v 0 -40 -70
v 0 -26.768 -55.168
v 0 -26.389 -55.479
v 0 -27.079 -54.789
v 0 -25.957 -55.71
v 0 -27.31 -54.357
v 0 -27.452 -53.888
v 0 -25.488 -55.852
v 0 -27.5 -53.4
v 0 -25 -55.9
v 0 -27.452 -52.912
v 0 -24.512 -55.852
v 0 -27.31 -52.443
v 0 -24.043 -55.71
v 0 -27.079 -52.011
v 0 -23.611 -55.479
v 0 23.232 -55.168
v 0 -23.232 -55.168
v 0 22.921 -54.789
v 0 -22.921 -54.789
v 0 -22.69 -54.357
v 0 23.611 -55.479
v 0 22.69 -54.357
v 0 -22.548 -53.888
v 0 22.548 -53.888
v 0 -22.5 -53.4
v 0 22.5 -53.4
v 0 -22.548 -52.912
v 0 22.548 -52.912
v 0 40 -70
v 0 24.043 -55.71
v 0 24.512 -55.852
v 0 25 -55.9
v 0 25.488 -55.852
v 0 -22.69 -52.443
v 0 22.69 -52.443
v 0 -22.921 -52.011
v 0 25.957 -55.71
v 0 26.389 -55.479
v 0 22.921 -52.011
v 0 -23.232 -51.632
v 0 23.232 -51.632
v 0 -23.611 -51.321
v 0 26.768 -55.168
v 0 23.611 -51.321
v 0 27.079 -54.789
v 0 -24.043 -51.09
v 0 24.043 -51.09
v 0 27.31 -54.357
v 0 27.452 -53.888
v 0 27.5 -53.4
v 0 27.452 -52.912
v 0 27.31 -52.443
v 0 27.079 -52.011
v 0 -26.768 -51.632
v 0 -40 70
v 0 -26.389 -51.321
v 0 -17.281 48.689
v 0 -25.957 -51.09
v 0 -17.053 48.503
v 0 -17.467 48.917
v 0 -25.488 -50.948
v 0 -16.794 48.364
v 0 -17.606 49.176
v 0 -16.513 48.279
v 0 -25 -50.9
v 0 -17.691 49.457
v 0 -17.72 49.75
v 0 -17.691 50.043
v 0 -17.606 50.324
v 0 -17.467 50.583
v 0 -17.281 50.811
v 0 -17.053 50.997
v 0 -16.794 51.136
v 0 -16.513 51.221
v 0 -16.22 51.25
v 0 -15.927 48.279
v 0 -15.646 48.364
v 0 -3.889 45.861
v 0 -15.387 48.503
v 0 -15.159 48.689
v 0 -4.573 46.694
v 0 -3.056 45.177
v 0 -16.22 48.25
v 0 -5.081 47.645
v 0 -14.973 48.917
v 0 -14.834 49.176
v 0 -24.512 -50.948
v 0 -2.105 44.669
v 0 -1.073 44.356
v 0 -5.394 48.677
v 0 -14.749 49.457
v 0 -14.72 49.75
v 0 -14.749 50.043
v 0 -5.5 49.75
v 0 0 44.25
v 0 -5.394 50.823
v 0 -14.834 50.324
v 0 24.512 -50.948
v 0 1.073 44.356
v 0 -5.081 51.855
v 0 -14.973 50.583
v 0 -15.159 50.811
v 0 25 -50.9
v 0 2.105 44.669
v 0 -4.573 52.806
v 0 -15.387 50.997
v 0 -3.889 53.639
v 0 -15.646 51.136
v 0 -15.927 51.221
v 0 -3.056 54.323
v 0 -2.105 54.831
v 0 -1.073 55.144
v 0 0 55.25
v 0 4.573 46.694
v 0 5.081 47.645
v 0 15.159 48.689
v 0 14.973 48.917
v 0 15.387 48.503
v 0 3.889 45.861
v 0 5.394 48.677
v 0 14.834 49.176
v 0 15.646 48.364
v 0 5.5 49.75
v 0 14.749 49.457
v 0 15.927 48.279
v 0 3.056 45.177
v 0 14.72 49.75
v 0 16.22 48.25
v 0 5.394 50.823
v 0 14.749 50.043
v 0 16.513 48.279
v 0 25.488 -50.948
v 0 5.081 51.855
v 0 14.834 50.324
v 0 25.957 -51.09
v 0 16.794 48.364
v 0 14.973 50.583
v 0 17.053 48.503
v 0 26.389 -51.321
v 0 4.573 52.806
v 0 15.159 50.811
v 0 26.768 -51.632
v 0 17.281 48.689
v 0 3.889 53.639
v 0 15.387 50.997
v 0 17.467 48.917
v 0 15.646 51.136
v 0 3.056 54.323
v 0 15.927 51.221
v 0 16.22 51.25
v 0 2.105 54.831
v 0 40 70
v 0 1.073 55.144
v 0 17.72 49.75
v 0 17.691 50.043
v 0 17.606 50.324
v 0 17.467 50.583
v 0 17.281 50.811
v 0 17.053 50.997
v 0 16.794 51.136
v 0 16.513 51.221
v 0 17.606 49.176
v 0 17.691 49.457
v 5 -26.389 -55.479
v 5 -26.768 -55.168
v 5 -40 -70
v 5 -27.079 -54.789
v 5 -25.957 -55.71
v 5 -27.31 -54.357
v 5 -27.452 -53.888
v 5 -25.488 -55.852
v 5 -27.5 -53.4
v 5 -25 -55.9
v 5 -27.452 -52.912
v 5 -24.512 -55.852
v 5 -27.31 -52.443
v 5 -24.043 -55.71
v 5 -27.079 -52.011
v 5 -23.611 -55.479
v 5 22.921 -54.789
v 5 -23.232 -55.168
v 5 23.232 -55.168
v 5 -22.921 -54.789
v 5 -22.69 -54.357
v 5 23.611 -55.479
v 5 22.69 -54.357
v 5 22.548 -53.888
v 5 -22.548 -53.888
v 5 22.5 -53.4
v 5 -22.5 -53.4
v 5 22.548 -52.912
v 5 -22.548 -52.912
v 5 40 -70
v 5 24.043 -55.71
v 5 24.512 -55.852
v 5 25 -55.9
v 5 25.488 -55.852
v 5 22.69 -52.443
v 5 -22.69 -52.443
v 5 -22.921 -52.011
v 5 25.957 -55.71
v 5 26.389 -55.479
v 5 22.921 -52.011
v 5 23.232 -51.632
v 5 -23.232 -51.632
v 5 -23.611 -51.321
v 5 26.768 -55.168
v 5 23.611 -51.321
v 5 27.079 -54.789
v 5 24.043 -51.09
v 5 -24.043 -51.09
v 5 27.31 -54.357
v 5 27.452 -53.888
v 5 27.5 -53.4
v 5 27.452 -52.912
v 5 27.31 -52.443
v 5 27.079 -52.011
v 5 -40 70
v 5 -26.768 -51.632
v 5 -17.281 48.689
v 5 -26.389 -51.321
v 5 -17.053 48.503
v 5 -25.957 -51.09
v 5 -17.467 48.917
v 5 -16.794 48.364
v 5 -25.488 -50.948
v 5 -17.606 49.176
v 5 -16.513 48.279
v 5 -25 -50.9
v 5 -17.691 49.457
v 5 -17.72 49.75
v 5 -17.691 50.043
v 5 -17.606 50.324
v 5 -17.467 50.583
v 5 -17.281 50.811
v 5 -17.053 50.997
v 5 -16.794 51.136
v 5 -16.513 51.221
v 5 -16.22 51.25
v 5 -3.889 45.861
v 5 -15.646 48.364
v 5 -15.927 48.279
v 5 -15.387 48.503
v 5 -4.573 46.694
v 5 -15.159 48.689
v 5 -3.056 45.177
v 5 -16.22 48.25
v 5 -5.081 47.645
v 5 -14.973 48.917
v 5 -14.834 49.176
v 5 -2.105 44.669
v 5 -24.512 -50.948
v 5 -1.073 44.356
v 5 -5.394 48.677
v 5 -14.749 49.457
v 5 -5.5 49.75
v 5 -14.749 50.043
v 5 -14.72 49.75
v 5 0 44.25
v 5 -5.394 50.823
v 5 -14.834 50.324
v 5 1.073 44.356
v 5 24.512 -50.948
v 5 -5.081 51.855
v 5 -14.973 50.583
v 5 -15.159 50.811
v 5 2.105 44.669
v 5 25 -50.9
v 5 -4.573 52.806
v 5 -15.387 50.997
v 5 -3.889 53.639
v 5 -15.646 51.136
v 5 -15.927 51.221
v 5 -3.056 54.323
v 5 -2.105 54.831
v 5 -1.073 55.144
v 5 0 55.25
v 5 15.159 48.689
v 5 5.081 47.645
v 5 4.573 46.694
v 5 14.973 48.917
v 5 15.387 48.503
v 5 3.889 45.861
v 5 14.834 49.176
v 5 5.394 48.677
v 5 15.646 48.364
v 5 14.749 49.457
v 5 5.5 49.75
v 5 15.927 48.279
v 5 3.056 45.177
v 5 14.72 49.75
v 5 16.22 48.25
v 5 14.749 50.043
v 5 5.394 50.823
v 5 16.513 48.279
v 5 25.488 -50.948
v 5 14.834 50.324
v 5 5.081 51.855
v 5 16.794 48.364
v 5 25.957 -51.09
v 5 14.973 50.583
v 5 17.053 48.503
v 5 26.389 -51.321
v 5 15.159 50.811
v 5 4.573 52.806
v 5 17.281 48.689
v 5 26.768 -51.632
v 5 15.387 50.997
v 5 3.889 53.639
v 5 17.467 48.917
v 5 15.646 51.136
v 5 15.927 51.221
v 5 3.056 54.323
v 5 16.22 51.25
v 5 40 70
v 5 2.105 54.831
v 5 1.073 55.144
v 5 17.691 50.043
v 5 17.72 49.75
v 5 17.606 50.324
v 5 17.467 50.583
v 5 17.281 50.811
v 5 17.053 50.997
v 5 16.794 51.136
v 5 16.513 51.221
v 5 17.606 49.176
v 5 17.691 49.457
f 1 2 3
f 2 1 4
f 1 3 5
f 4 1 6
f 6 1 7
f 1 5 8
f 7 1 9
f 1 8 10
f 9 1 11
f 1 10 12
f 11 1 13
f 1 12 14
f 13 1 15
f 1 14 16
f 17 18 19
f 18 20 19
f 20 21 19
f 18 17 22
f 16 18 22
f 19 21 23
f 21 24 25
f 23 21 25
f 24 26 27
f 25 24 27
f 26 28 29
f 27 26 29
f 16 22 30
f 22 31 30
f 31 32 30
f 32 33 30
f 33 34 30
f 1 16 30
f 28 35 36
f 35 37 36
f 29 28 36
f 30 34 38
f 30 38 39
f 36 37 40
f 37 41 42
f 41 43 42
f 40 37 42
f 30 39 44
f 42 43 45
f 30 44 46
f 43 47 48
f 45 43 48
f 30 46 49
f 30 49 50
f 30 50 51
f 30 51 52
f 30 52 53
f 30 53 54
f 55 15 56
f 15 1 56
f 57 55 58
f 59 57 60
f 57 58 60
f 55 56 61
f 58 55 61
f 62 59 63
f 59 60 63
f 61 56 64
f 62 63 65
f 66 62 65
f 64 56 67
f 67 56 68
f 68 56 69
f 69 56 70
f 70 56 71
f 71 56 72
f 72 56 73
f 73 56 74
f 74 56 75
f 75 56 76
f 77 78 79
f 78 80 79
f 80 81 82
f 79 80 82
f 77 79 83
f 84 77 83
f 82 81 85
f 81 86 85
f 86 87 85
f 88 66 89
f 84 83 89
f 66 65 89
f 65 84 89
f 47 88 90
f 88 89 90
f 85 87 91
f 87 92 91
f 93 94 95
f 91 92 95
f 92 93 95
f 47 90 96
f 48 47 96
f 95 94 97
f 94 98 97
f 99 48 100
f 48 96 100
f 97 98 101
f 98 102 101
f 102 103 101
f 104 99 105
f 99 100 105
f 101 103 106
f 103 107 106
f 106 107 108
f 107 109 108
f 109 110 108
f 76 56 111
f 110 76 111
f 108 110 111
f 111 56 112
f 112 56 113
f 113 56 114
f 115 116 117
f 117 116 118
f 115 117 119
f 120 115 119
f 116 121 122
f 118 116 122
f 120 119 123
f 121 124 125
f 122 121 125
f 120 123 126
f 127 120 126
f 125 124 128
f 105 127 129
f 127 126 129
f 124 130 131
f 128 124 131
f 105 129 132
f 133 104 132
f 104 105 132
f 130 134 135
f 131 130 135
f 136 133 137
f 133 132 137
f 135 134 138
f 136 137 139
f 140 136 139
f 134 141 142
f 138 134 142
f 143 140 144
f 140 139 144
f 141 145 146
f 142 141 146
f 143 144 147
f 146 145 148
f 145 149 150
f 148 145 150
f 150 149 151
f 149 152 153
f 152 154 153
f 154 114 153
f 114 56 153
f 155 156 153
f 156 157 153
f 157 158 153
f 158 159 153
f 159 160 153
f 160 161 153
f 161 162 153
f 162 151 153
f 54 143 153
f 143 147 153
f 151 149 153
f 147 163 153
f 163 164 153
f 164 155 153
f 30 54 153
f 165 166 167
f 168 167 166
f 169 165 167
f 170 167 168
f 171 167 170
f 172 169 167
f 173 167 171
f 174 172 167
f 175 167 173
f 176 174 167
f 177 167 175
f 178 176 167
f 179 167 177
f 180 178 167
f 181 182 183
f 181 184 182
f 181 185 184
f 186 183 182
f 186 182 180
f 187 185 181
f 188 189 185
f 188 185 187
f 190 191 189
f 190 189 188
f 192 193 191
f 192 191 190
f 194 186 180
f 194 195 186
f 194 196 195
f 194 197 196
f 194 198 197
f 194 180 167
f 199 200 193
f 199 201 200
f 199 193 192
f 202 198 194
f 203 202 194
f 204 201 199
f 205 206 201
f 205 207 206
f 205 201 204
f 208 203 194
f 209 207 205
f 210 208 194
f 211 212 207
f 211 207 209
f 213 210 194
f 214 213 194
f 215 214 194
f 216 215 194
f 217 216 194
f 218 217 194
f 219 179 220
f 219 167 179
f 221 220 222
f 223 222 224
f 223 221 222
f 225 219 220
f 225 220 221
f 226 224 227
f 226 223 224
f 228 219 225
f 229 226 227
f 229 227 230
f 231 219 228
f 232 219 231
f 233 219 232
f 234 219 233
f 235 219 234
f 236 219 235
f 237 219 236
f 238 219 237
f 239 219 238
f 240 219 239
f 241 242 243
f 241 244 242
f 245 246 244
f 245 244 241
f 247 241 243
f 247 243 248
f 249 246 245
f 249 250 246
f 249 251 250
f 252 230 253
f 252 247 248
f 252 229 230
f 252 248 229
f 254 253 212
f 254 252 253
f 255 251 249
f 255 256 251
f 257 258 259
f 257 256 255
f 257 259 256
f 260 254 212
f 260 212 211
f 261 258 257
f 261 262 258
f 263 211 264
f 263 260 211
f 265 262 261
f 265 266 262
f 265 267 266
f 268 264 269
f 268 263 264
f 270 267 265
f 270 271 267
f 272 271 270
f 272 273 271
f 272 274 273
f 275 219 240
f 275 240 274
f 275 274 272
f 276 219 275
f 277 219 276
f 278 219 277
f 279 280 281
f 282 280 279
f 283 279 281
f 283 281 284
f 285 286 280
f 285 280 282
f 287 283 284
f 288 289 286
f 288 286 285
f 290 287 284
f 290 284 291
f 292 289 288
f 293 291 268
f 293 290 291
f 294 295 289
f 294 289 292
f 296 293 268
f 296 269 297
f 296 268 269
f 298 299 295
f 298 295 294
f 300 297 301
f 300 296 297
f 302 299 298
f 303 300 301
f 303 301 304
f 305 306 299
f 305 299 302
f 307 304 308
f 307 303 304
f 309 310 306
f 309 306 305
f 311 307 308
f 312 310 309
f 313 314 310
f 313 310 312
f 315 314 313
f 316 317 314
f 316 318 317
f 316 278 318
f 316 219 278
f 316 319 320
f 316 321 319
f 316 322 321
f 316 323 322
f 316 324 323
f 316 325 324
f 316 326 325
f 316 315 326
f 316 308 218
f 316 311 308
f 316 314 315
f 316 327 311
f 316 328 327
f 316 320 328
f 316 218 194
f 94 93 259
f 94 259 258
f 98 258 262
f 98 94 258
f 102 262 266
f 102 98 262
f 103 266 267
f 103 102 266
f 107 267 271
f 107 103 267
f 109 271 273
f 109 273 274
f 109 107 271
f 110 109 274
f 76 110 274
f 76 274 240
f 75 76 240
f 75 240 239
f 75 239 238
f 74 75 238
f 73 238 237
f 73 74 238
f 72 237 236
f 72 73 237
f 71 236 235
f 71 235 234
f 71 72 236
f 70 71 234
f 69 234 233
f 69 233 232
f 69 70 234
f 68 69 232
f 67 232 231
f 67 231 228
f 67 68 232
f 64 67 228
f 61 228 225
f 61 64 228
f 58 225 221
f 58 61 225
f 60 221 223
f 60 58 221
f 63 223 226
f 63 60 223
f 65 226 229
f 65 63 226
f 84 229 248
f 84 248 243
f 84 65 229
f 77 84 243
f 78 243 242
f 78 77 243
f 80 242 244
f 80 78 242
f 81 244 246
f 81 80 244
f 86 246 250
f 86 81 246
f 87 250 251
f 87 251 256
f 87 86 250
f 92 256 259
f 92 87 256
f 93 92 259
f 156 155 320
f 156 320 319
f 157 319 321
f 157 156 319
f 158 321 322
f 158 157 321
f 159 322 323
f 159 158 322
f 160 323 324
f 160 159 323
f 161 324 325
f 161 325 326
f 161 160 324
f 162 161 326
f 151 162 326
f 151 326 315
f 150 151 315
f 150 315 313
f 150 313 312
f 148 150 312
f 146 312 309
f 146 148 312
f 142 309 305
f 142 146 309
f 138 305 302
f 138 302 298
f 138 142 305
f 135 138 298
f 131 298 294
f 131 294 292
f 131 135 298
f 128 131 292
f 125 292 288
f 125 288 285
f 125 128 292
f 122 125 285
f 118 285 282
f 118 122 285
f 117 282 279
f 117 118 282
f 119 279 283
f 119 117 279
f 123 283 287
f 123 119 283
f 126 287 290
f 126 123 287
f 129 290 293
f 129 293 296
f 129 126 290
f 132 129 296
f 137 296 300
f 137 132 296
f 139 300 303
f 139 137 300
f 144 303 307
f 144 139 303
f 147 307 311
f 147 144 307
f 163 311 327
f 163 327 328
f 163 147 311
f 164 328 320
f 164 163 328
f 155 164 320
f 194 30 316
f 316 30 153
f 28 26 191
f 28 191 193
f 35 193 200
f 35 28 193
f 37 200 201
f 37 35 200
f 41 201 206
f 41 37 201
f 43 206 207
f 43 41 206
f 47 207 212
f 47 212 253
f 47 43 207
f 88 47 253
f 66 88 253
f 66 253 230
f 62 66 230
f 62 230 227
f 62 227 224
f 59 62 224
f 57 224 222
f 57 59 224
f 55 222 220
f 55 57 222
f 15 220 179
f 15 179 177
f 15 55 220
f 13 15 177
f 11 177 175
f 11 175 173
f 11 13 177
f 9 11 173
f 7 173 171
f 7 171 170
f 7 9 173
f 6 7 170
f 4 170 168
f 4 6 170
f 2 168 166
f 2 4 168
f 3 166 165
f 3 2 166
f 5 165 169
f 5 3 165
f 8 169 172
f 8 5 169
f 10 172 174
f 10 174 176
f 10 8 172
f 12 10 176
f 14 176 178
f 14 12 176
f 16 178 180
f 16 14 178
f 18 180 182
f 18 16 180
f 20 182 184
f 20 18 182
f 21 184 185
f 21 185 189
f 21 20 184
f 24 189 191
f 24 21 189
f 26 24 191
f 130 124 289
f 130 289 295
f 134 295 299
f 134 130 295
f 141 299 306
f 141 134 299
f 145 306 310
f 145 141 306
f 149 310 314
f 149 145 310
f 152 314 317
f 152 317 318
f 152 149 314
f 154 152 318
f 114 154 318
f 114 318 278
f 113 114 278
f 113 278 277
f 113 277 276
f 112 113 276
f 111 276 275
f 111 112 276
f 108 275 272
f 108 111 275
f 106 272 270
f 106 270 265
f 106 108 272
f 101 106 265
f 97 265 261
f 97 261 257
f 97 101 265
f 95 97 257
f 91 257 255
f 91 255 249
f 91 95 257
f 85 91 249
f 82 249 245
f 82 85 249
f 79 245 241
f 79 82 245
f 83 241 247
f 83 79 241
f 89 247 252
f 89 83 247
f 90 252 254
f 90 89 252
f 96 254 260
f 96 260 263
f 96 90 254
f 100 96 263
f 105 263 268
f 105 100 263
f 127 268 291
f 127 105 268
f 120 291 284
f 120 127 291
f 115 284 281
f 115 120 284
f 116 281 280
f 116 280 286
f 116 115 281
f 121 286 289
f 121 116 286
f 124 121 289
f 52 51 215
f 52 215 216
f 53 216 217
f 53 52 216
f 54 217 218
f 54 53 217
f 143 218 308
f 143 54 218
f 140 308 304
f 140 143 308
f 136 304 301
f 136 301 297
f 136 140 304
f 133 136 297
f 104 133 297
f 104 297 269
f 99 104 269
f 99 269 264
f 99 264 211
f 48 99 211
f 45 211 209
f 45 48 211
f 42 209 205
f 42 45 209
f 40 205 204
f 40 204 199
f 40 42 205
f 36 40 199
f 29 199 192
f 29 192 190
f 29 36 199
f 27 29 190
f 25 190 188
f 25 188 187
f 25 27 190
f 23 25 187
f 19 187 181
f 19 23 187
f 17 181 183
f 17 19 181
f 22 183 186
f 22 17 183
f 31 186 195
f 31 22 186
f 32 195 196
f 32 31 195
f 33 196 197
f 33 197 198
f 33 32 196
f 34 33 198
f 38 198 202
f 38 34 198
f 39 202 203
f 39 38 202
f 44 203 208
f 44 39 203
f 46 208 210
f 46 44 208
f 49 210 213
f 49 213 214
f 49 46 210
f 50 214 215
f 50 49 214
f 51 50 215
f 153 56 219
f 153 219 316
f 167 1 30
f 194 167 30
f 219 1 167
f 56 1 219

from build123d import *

# Parameters (mm, degrees)
SKETCH1_W           = 80
SKETCH1_H           = 140
SKETCH1_R           = 5.5
SKETCH1_R_2         = 1.5
SKETCH1_R_3         = 2.5
BOSS_EXTRUDE1_DEPTH = 5


with BuildPart() as part:
    # Sketch1 → Boss-Extrude1 (new body)
    with BuildSketch(Plane.YZ):
        Rectangle(SKETCH1_W, SKETCH1_H)
        with Locations((0, 49.75)):
            Circle(SKETCH1_R, mode=Mode.SUBTRACT)
        with Locations((-16.22, 49.75)):
            Circle(SKETCH1_R_2, mode=Mode.SUBTRACT)
        with Locations((16.22, 49.75)):
            Circle(SKETCH1_R_2, mode=Mode.SUBTRACT)
        with Locations((-25, -53.4)):
            Circle(SKETCH1_R_3, mode=Mode.SUBTRACT)
        with Locations((25, -53.4)):
            Circle(SKETCH1_R_3, mode=Mode.SUBTRACT)
    extrude(amount=BOSS_EXTRUDE1_DEPTH)


solid = part.part
